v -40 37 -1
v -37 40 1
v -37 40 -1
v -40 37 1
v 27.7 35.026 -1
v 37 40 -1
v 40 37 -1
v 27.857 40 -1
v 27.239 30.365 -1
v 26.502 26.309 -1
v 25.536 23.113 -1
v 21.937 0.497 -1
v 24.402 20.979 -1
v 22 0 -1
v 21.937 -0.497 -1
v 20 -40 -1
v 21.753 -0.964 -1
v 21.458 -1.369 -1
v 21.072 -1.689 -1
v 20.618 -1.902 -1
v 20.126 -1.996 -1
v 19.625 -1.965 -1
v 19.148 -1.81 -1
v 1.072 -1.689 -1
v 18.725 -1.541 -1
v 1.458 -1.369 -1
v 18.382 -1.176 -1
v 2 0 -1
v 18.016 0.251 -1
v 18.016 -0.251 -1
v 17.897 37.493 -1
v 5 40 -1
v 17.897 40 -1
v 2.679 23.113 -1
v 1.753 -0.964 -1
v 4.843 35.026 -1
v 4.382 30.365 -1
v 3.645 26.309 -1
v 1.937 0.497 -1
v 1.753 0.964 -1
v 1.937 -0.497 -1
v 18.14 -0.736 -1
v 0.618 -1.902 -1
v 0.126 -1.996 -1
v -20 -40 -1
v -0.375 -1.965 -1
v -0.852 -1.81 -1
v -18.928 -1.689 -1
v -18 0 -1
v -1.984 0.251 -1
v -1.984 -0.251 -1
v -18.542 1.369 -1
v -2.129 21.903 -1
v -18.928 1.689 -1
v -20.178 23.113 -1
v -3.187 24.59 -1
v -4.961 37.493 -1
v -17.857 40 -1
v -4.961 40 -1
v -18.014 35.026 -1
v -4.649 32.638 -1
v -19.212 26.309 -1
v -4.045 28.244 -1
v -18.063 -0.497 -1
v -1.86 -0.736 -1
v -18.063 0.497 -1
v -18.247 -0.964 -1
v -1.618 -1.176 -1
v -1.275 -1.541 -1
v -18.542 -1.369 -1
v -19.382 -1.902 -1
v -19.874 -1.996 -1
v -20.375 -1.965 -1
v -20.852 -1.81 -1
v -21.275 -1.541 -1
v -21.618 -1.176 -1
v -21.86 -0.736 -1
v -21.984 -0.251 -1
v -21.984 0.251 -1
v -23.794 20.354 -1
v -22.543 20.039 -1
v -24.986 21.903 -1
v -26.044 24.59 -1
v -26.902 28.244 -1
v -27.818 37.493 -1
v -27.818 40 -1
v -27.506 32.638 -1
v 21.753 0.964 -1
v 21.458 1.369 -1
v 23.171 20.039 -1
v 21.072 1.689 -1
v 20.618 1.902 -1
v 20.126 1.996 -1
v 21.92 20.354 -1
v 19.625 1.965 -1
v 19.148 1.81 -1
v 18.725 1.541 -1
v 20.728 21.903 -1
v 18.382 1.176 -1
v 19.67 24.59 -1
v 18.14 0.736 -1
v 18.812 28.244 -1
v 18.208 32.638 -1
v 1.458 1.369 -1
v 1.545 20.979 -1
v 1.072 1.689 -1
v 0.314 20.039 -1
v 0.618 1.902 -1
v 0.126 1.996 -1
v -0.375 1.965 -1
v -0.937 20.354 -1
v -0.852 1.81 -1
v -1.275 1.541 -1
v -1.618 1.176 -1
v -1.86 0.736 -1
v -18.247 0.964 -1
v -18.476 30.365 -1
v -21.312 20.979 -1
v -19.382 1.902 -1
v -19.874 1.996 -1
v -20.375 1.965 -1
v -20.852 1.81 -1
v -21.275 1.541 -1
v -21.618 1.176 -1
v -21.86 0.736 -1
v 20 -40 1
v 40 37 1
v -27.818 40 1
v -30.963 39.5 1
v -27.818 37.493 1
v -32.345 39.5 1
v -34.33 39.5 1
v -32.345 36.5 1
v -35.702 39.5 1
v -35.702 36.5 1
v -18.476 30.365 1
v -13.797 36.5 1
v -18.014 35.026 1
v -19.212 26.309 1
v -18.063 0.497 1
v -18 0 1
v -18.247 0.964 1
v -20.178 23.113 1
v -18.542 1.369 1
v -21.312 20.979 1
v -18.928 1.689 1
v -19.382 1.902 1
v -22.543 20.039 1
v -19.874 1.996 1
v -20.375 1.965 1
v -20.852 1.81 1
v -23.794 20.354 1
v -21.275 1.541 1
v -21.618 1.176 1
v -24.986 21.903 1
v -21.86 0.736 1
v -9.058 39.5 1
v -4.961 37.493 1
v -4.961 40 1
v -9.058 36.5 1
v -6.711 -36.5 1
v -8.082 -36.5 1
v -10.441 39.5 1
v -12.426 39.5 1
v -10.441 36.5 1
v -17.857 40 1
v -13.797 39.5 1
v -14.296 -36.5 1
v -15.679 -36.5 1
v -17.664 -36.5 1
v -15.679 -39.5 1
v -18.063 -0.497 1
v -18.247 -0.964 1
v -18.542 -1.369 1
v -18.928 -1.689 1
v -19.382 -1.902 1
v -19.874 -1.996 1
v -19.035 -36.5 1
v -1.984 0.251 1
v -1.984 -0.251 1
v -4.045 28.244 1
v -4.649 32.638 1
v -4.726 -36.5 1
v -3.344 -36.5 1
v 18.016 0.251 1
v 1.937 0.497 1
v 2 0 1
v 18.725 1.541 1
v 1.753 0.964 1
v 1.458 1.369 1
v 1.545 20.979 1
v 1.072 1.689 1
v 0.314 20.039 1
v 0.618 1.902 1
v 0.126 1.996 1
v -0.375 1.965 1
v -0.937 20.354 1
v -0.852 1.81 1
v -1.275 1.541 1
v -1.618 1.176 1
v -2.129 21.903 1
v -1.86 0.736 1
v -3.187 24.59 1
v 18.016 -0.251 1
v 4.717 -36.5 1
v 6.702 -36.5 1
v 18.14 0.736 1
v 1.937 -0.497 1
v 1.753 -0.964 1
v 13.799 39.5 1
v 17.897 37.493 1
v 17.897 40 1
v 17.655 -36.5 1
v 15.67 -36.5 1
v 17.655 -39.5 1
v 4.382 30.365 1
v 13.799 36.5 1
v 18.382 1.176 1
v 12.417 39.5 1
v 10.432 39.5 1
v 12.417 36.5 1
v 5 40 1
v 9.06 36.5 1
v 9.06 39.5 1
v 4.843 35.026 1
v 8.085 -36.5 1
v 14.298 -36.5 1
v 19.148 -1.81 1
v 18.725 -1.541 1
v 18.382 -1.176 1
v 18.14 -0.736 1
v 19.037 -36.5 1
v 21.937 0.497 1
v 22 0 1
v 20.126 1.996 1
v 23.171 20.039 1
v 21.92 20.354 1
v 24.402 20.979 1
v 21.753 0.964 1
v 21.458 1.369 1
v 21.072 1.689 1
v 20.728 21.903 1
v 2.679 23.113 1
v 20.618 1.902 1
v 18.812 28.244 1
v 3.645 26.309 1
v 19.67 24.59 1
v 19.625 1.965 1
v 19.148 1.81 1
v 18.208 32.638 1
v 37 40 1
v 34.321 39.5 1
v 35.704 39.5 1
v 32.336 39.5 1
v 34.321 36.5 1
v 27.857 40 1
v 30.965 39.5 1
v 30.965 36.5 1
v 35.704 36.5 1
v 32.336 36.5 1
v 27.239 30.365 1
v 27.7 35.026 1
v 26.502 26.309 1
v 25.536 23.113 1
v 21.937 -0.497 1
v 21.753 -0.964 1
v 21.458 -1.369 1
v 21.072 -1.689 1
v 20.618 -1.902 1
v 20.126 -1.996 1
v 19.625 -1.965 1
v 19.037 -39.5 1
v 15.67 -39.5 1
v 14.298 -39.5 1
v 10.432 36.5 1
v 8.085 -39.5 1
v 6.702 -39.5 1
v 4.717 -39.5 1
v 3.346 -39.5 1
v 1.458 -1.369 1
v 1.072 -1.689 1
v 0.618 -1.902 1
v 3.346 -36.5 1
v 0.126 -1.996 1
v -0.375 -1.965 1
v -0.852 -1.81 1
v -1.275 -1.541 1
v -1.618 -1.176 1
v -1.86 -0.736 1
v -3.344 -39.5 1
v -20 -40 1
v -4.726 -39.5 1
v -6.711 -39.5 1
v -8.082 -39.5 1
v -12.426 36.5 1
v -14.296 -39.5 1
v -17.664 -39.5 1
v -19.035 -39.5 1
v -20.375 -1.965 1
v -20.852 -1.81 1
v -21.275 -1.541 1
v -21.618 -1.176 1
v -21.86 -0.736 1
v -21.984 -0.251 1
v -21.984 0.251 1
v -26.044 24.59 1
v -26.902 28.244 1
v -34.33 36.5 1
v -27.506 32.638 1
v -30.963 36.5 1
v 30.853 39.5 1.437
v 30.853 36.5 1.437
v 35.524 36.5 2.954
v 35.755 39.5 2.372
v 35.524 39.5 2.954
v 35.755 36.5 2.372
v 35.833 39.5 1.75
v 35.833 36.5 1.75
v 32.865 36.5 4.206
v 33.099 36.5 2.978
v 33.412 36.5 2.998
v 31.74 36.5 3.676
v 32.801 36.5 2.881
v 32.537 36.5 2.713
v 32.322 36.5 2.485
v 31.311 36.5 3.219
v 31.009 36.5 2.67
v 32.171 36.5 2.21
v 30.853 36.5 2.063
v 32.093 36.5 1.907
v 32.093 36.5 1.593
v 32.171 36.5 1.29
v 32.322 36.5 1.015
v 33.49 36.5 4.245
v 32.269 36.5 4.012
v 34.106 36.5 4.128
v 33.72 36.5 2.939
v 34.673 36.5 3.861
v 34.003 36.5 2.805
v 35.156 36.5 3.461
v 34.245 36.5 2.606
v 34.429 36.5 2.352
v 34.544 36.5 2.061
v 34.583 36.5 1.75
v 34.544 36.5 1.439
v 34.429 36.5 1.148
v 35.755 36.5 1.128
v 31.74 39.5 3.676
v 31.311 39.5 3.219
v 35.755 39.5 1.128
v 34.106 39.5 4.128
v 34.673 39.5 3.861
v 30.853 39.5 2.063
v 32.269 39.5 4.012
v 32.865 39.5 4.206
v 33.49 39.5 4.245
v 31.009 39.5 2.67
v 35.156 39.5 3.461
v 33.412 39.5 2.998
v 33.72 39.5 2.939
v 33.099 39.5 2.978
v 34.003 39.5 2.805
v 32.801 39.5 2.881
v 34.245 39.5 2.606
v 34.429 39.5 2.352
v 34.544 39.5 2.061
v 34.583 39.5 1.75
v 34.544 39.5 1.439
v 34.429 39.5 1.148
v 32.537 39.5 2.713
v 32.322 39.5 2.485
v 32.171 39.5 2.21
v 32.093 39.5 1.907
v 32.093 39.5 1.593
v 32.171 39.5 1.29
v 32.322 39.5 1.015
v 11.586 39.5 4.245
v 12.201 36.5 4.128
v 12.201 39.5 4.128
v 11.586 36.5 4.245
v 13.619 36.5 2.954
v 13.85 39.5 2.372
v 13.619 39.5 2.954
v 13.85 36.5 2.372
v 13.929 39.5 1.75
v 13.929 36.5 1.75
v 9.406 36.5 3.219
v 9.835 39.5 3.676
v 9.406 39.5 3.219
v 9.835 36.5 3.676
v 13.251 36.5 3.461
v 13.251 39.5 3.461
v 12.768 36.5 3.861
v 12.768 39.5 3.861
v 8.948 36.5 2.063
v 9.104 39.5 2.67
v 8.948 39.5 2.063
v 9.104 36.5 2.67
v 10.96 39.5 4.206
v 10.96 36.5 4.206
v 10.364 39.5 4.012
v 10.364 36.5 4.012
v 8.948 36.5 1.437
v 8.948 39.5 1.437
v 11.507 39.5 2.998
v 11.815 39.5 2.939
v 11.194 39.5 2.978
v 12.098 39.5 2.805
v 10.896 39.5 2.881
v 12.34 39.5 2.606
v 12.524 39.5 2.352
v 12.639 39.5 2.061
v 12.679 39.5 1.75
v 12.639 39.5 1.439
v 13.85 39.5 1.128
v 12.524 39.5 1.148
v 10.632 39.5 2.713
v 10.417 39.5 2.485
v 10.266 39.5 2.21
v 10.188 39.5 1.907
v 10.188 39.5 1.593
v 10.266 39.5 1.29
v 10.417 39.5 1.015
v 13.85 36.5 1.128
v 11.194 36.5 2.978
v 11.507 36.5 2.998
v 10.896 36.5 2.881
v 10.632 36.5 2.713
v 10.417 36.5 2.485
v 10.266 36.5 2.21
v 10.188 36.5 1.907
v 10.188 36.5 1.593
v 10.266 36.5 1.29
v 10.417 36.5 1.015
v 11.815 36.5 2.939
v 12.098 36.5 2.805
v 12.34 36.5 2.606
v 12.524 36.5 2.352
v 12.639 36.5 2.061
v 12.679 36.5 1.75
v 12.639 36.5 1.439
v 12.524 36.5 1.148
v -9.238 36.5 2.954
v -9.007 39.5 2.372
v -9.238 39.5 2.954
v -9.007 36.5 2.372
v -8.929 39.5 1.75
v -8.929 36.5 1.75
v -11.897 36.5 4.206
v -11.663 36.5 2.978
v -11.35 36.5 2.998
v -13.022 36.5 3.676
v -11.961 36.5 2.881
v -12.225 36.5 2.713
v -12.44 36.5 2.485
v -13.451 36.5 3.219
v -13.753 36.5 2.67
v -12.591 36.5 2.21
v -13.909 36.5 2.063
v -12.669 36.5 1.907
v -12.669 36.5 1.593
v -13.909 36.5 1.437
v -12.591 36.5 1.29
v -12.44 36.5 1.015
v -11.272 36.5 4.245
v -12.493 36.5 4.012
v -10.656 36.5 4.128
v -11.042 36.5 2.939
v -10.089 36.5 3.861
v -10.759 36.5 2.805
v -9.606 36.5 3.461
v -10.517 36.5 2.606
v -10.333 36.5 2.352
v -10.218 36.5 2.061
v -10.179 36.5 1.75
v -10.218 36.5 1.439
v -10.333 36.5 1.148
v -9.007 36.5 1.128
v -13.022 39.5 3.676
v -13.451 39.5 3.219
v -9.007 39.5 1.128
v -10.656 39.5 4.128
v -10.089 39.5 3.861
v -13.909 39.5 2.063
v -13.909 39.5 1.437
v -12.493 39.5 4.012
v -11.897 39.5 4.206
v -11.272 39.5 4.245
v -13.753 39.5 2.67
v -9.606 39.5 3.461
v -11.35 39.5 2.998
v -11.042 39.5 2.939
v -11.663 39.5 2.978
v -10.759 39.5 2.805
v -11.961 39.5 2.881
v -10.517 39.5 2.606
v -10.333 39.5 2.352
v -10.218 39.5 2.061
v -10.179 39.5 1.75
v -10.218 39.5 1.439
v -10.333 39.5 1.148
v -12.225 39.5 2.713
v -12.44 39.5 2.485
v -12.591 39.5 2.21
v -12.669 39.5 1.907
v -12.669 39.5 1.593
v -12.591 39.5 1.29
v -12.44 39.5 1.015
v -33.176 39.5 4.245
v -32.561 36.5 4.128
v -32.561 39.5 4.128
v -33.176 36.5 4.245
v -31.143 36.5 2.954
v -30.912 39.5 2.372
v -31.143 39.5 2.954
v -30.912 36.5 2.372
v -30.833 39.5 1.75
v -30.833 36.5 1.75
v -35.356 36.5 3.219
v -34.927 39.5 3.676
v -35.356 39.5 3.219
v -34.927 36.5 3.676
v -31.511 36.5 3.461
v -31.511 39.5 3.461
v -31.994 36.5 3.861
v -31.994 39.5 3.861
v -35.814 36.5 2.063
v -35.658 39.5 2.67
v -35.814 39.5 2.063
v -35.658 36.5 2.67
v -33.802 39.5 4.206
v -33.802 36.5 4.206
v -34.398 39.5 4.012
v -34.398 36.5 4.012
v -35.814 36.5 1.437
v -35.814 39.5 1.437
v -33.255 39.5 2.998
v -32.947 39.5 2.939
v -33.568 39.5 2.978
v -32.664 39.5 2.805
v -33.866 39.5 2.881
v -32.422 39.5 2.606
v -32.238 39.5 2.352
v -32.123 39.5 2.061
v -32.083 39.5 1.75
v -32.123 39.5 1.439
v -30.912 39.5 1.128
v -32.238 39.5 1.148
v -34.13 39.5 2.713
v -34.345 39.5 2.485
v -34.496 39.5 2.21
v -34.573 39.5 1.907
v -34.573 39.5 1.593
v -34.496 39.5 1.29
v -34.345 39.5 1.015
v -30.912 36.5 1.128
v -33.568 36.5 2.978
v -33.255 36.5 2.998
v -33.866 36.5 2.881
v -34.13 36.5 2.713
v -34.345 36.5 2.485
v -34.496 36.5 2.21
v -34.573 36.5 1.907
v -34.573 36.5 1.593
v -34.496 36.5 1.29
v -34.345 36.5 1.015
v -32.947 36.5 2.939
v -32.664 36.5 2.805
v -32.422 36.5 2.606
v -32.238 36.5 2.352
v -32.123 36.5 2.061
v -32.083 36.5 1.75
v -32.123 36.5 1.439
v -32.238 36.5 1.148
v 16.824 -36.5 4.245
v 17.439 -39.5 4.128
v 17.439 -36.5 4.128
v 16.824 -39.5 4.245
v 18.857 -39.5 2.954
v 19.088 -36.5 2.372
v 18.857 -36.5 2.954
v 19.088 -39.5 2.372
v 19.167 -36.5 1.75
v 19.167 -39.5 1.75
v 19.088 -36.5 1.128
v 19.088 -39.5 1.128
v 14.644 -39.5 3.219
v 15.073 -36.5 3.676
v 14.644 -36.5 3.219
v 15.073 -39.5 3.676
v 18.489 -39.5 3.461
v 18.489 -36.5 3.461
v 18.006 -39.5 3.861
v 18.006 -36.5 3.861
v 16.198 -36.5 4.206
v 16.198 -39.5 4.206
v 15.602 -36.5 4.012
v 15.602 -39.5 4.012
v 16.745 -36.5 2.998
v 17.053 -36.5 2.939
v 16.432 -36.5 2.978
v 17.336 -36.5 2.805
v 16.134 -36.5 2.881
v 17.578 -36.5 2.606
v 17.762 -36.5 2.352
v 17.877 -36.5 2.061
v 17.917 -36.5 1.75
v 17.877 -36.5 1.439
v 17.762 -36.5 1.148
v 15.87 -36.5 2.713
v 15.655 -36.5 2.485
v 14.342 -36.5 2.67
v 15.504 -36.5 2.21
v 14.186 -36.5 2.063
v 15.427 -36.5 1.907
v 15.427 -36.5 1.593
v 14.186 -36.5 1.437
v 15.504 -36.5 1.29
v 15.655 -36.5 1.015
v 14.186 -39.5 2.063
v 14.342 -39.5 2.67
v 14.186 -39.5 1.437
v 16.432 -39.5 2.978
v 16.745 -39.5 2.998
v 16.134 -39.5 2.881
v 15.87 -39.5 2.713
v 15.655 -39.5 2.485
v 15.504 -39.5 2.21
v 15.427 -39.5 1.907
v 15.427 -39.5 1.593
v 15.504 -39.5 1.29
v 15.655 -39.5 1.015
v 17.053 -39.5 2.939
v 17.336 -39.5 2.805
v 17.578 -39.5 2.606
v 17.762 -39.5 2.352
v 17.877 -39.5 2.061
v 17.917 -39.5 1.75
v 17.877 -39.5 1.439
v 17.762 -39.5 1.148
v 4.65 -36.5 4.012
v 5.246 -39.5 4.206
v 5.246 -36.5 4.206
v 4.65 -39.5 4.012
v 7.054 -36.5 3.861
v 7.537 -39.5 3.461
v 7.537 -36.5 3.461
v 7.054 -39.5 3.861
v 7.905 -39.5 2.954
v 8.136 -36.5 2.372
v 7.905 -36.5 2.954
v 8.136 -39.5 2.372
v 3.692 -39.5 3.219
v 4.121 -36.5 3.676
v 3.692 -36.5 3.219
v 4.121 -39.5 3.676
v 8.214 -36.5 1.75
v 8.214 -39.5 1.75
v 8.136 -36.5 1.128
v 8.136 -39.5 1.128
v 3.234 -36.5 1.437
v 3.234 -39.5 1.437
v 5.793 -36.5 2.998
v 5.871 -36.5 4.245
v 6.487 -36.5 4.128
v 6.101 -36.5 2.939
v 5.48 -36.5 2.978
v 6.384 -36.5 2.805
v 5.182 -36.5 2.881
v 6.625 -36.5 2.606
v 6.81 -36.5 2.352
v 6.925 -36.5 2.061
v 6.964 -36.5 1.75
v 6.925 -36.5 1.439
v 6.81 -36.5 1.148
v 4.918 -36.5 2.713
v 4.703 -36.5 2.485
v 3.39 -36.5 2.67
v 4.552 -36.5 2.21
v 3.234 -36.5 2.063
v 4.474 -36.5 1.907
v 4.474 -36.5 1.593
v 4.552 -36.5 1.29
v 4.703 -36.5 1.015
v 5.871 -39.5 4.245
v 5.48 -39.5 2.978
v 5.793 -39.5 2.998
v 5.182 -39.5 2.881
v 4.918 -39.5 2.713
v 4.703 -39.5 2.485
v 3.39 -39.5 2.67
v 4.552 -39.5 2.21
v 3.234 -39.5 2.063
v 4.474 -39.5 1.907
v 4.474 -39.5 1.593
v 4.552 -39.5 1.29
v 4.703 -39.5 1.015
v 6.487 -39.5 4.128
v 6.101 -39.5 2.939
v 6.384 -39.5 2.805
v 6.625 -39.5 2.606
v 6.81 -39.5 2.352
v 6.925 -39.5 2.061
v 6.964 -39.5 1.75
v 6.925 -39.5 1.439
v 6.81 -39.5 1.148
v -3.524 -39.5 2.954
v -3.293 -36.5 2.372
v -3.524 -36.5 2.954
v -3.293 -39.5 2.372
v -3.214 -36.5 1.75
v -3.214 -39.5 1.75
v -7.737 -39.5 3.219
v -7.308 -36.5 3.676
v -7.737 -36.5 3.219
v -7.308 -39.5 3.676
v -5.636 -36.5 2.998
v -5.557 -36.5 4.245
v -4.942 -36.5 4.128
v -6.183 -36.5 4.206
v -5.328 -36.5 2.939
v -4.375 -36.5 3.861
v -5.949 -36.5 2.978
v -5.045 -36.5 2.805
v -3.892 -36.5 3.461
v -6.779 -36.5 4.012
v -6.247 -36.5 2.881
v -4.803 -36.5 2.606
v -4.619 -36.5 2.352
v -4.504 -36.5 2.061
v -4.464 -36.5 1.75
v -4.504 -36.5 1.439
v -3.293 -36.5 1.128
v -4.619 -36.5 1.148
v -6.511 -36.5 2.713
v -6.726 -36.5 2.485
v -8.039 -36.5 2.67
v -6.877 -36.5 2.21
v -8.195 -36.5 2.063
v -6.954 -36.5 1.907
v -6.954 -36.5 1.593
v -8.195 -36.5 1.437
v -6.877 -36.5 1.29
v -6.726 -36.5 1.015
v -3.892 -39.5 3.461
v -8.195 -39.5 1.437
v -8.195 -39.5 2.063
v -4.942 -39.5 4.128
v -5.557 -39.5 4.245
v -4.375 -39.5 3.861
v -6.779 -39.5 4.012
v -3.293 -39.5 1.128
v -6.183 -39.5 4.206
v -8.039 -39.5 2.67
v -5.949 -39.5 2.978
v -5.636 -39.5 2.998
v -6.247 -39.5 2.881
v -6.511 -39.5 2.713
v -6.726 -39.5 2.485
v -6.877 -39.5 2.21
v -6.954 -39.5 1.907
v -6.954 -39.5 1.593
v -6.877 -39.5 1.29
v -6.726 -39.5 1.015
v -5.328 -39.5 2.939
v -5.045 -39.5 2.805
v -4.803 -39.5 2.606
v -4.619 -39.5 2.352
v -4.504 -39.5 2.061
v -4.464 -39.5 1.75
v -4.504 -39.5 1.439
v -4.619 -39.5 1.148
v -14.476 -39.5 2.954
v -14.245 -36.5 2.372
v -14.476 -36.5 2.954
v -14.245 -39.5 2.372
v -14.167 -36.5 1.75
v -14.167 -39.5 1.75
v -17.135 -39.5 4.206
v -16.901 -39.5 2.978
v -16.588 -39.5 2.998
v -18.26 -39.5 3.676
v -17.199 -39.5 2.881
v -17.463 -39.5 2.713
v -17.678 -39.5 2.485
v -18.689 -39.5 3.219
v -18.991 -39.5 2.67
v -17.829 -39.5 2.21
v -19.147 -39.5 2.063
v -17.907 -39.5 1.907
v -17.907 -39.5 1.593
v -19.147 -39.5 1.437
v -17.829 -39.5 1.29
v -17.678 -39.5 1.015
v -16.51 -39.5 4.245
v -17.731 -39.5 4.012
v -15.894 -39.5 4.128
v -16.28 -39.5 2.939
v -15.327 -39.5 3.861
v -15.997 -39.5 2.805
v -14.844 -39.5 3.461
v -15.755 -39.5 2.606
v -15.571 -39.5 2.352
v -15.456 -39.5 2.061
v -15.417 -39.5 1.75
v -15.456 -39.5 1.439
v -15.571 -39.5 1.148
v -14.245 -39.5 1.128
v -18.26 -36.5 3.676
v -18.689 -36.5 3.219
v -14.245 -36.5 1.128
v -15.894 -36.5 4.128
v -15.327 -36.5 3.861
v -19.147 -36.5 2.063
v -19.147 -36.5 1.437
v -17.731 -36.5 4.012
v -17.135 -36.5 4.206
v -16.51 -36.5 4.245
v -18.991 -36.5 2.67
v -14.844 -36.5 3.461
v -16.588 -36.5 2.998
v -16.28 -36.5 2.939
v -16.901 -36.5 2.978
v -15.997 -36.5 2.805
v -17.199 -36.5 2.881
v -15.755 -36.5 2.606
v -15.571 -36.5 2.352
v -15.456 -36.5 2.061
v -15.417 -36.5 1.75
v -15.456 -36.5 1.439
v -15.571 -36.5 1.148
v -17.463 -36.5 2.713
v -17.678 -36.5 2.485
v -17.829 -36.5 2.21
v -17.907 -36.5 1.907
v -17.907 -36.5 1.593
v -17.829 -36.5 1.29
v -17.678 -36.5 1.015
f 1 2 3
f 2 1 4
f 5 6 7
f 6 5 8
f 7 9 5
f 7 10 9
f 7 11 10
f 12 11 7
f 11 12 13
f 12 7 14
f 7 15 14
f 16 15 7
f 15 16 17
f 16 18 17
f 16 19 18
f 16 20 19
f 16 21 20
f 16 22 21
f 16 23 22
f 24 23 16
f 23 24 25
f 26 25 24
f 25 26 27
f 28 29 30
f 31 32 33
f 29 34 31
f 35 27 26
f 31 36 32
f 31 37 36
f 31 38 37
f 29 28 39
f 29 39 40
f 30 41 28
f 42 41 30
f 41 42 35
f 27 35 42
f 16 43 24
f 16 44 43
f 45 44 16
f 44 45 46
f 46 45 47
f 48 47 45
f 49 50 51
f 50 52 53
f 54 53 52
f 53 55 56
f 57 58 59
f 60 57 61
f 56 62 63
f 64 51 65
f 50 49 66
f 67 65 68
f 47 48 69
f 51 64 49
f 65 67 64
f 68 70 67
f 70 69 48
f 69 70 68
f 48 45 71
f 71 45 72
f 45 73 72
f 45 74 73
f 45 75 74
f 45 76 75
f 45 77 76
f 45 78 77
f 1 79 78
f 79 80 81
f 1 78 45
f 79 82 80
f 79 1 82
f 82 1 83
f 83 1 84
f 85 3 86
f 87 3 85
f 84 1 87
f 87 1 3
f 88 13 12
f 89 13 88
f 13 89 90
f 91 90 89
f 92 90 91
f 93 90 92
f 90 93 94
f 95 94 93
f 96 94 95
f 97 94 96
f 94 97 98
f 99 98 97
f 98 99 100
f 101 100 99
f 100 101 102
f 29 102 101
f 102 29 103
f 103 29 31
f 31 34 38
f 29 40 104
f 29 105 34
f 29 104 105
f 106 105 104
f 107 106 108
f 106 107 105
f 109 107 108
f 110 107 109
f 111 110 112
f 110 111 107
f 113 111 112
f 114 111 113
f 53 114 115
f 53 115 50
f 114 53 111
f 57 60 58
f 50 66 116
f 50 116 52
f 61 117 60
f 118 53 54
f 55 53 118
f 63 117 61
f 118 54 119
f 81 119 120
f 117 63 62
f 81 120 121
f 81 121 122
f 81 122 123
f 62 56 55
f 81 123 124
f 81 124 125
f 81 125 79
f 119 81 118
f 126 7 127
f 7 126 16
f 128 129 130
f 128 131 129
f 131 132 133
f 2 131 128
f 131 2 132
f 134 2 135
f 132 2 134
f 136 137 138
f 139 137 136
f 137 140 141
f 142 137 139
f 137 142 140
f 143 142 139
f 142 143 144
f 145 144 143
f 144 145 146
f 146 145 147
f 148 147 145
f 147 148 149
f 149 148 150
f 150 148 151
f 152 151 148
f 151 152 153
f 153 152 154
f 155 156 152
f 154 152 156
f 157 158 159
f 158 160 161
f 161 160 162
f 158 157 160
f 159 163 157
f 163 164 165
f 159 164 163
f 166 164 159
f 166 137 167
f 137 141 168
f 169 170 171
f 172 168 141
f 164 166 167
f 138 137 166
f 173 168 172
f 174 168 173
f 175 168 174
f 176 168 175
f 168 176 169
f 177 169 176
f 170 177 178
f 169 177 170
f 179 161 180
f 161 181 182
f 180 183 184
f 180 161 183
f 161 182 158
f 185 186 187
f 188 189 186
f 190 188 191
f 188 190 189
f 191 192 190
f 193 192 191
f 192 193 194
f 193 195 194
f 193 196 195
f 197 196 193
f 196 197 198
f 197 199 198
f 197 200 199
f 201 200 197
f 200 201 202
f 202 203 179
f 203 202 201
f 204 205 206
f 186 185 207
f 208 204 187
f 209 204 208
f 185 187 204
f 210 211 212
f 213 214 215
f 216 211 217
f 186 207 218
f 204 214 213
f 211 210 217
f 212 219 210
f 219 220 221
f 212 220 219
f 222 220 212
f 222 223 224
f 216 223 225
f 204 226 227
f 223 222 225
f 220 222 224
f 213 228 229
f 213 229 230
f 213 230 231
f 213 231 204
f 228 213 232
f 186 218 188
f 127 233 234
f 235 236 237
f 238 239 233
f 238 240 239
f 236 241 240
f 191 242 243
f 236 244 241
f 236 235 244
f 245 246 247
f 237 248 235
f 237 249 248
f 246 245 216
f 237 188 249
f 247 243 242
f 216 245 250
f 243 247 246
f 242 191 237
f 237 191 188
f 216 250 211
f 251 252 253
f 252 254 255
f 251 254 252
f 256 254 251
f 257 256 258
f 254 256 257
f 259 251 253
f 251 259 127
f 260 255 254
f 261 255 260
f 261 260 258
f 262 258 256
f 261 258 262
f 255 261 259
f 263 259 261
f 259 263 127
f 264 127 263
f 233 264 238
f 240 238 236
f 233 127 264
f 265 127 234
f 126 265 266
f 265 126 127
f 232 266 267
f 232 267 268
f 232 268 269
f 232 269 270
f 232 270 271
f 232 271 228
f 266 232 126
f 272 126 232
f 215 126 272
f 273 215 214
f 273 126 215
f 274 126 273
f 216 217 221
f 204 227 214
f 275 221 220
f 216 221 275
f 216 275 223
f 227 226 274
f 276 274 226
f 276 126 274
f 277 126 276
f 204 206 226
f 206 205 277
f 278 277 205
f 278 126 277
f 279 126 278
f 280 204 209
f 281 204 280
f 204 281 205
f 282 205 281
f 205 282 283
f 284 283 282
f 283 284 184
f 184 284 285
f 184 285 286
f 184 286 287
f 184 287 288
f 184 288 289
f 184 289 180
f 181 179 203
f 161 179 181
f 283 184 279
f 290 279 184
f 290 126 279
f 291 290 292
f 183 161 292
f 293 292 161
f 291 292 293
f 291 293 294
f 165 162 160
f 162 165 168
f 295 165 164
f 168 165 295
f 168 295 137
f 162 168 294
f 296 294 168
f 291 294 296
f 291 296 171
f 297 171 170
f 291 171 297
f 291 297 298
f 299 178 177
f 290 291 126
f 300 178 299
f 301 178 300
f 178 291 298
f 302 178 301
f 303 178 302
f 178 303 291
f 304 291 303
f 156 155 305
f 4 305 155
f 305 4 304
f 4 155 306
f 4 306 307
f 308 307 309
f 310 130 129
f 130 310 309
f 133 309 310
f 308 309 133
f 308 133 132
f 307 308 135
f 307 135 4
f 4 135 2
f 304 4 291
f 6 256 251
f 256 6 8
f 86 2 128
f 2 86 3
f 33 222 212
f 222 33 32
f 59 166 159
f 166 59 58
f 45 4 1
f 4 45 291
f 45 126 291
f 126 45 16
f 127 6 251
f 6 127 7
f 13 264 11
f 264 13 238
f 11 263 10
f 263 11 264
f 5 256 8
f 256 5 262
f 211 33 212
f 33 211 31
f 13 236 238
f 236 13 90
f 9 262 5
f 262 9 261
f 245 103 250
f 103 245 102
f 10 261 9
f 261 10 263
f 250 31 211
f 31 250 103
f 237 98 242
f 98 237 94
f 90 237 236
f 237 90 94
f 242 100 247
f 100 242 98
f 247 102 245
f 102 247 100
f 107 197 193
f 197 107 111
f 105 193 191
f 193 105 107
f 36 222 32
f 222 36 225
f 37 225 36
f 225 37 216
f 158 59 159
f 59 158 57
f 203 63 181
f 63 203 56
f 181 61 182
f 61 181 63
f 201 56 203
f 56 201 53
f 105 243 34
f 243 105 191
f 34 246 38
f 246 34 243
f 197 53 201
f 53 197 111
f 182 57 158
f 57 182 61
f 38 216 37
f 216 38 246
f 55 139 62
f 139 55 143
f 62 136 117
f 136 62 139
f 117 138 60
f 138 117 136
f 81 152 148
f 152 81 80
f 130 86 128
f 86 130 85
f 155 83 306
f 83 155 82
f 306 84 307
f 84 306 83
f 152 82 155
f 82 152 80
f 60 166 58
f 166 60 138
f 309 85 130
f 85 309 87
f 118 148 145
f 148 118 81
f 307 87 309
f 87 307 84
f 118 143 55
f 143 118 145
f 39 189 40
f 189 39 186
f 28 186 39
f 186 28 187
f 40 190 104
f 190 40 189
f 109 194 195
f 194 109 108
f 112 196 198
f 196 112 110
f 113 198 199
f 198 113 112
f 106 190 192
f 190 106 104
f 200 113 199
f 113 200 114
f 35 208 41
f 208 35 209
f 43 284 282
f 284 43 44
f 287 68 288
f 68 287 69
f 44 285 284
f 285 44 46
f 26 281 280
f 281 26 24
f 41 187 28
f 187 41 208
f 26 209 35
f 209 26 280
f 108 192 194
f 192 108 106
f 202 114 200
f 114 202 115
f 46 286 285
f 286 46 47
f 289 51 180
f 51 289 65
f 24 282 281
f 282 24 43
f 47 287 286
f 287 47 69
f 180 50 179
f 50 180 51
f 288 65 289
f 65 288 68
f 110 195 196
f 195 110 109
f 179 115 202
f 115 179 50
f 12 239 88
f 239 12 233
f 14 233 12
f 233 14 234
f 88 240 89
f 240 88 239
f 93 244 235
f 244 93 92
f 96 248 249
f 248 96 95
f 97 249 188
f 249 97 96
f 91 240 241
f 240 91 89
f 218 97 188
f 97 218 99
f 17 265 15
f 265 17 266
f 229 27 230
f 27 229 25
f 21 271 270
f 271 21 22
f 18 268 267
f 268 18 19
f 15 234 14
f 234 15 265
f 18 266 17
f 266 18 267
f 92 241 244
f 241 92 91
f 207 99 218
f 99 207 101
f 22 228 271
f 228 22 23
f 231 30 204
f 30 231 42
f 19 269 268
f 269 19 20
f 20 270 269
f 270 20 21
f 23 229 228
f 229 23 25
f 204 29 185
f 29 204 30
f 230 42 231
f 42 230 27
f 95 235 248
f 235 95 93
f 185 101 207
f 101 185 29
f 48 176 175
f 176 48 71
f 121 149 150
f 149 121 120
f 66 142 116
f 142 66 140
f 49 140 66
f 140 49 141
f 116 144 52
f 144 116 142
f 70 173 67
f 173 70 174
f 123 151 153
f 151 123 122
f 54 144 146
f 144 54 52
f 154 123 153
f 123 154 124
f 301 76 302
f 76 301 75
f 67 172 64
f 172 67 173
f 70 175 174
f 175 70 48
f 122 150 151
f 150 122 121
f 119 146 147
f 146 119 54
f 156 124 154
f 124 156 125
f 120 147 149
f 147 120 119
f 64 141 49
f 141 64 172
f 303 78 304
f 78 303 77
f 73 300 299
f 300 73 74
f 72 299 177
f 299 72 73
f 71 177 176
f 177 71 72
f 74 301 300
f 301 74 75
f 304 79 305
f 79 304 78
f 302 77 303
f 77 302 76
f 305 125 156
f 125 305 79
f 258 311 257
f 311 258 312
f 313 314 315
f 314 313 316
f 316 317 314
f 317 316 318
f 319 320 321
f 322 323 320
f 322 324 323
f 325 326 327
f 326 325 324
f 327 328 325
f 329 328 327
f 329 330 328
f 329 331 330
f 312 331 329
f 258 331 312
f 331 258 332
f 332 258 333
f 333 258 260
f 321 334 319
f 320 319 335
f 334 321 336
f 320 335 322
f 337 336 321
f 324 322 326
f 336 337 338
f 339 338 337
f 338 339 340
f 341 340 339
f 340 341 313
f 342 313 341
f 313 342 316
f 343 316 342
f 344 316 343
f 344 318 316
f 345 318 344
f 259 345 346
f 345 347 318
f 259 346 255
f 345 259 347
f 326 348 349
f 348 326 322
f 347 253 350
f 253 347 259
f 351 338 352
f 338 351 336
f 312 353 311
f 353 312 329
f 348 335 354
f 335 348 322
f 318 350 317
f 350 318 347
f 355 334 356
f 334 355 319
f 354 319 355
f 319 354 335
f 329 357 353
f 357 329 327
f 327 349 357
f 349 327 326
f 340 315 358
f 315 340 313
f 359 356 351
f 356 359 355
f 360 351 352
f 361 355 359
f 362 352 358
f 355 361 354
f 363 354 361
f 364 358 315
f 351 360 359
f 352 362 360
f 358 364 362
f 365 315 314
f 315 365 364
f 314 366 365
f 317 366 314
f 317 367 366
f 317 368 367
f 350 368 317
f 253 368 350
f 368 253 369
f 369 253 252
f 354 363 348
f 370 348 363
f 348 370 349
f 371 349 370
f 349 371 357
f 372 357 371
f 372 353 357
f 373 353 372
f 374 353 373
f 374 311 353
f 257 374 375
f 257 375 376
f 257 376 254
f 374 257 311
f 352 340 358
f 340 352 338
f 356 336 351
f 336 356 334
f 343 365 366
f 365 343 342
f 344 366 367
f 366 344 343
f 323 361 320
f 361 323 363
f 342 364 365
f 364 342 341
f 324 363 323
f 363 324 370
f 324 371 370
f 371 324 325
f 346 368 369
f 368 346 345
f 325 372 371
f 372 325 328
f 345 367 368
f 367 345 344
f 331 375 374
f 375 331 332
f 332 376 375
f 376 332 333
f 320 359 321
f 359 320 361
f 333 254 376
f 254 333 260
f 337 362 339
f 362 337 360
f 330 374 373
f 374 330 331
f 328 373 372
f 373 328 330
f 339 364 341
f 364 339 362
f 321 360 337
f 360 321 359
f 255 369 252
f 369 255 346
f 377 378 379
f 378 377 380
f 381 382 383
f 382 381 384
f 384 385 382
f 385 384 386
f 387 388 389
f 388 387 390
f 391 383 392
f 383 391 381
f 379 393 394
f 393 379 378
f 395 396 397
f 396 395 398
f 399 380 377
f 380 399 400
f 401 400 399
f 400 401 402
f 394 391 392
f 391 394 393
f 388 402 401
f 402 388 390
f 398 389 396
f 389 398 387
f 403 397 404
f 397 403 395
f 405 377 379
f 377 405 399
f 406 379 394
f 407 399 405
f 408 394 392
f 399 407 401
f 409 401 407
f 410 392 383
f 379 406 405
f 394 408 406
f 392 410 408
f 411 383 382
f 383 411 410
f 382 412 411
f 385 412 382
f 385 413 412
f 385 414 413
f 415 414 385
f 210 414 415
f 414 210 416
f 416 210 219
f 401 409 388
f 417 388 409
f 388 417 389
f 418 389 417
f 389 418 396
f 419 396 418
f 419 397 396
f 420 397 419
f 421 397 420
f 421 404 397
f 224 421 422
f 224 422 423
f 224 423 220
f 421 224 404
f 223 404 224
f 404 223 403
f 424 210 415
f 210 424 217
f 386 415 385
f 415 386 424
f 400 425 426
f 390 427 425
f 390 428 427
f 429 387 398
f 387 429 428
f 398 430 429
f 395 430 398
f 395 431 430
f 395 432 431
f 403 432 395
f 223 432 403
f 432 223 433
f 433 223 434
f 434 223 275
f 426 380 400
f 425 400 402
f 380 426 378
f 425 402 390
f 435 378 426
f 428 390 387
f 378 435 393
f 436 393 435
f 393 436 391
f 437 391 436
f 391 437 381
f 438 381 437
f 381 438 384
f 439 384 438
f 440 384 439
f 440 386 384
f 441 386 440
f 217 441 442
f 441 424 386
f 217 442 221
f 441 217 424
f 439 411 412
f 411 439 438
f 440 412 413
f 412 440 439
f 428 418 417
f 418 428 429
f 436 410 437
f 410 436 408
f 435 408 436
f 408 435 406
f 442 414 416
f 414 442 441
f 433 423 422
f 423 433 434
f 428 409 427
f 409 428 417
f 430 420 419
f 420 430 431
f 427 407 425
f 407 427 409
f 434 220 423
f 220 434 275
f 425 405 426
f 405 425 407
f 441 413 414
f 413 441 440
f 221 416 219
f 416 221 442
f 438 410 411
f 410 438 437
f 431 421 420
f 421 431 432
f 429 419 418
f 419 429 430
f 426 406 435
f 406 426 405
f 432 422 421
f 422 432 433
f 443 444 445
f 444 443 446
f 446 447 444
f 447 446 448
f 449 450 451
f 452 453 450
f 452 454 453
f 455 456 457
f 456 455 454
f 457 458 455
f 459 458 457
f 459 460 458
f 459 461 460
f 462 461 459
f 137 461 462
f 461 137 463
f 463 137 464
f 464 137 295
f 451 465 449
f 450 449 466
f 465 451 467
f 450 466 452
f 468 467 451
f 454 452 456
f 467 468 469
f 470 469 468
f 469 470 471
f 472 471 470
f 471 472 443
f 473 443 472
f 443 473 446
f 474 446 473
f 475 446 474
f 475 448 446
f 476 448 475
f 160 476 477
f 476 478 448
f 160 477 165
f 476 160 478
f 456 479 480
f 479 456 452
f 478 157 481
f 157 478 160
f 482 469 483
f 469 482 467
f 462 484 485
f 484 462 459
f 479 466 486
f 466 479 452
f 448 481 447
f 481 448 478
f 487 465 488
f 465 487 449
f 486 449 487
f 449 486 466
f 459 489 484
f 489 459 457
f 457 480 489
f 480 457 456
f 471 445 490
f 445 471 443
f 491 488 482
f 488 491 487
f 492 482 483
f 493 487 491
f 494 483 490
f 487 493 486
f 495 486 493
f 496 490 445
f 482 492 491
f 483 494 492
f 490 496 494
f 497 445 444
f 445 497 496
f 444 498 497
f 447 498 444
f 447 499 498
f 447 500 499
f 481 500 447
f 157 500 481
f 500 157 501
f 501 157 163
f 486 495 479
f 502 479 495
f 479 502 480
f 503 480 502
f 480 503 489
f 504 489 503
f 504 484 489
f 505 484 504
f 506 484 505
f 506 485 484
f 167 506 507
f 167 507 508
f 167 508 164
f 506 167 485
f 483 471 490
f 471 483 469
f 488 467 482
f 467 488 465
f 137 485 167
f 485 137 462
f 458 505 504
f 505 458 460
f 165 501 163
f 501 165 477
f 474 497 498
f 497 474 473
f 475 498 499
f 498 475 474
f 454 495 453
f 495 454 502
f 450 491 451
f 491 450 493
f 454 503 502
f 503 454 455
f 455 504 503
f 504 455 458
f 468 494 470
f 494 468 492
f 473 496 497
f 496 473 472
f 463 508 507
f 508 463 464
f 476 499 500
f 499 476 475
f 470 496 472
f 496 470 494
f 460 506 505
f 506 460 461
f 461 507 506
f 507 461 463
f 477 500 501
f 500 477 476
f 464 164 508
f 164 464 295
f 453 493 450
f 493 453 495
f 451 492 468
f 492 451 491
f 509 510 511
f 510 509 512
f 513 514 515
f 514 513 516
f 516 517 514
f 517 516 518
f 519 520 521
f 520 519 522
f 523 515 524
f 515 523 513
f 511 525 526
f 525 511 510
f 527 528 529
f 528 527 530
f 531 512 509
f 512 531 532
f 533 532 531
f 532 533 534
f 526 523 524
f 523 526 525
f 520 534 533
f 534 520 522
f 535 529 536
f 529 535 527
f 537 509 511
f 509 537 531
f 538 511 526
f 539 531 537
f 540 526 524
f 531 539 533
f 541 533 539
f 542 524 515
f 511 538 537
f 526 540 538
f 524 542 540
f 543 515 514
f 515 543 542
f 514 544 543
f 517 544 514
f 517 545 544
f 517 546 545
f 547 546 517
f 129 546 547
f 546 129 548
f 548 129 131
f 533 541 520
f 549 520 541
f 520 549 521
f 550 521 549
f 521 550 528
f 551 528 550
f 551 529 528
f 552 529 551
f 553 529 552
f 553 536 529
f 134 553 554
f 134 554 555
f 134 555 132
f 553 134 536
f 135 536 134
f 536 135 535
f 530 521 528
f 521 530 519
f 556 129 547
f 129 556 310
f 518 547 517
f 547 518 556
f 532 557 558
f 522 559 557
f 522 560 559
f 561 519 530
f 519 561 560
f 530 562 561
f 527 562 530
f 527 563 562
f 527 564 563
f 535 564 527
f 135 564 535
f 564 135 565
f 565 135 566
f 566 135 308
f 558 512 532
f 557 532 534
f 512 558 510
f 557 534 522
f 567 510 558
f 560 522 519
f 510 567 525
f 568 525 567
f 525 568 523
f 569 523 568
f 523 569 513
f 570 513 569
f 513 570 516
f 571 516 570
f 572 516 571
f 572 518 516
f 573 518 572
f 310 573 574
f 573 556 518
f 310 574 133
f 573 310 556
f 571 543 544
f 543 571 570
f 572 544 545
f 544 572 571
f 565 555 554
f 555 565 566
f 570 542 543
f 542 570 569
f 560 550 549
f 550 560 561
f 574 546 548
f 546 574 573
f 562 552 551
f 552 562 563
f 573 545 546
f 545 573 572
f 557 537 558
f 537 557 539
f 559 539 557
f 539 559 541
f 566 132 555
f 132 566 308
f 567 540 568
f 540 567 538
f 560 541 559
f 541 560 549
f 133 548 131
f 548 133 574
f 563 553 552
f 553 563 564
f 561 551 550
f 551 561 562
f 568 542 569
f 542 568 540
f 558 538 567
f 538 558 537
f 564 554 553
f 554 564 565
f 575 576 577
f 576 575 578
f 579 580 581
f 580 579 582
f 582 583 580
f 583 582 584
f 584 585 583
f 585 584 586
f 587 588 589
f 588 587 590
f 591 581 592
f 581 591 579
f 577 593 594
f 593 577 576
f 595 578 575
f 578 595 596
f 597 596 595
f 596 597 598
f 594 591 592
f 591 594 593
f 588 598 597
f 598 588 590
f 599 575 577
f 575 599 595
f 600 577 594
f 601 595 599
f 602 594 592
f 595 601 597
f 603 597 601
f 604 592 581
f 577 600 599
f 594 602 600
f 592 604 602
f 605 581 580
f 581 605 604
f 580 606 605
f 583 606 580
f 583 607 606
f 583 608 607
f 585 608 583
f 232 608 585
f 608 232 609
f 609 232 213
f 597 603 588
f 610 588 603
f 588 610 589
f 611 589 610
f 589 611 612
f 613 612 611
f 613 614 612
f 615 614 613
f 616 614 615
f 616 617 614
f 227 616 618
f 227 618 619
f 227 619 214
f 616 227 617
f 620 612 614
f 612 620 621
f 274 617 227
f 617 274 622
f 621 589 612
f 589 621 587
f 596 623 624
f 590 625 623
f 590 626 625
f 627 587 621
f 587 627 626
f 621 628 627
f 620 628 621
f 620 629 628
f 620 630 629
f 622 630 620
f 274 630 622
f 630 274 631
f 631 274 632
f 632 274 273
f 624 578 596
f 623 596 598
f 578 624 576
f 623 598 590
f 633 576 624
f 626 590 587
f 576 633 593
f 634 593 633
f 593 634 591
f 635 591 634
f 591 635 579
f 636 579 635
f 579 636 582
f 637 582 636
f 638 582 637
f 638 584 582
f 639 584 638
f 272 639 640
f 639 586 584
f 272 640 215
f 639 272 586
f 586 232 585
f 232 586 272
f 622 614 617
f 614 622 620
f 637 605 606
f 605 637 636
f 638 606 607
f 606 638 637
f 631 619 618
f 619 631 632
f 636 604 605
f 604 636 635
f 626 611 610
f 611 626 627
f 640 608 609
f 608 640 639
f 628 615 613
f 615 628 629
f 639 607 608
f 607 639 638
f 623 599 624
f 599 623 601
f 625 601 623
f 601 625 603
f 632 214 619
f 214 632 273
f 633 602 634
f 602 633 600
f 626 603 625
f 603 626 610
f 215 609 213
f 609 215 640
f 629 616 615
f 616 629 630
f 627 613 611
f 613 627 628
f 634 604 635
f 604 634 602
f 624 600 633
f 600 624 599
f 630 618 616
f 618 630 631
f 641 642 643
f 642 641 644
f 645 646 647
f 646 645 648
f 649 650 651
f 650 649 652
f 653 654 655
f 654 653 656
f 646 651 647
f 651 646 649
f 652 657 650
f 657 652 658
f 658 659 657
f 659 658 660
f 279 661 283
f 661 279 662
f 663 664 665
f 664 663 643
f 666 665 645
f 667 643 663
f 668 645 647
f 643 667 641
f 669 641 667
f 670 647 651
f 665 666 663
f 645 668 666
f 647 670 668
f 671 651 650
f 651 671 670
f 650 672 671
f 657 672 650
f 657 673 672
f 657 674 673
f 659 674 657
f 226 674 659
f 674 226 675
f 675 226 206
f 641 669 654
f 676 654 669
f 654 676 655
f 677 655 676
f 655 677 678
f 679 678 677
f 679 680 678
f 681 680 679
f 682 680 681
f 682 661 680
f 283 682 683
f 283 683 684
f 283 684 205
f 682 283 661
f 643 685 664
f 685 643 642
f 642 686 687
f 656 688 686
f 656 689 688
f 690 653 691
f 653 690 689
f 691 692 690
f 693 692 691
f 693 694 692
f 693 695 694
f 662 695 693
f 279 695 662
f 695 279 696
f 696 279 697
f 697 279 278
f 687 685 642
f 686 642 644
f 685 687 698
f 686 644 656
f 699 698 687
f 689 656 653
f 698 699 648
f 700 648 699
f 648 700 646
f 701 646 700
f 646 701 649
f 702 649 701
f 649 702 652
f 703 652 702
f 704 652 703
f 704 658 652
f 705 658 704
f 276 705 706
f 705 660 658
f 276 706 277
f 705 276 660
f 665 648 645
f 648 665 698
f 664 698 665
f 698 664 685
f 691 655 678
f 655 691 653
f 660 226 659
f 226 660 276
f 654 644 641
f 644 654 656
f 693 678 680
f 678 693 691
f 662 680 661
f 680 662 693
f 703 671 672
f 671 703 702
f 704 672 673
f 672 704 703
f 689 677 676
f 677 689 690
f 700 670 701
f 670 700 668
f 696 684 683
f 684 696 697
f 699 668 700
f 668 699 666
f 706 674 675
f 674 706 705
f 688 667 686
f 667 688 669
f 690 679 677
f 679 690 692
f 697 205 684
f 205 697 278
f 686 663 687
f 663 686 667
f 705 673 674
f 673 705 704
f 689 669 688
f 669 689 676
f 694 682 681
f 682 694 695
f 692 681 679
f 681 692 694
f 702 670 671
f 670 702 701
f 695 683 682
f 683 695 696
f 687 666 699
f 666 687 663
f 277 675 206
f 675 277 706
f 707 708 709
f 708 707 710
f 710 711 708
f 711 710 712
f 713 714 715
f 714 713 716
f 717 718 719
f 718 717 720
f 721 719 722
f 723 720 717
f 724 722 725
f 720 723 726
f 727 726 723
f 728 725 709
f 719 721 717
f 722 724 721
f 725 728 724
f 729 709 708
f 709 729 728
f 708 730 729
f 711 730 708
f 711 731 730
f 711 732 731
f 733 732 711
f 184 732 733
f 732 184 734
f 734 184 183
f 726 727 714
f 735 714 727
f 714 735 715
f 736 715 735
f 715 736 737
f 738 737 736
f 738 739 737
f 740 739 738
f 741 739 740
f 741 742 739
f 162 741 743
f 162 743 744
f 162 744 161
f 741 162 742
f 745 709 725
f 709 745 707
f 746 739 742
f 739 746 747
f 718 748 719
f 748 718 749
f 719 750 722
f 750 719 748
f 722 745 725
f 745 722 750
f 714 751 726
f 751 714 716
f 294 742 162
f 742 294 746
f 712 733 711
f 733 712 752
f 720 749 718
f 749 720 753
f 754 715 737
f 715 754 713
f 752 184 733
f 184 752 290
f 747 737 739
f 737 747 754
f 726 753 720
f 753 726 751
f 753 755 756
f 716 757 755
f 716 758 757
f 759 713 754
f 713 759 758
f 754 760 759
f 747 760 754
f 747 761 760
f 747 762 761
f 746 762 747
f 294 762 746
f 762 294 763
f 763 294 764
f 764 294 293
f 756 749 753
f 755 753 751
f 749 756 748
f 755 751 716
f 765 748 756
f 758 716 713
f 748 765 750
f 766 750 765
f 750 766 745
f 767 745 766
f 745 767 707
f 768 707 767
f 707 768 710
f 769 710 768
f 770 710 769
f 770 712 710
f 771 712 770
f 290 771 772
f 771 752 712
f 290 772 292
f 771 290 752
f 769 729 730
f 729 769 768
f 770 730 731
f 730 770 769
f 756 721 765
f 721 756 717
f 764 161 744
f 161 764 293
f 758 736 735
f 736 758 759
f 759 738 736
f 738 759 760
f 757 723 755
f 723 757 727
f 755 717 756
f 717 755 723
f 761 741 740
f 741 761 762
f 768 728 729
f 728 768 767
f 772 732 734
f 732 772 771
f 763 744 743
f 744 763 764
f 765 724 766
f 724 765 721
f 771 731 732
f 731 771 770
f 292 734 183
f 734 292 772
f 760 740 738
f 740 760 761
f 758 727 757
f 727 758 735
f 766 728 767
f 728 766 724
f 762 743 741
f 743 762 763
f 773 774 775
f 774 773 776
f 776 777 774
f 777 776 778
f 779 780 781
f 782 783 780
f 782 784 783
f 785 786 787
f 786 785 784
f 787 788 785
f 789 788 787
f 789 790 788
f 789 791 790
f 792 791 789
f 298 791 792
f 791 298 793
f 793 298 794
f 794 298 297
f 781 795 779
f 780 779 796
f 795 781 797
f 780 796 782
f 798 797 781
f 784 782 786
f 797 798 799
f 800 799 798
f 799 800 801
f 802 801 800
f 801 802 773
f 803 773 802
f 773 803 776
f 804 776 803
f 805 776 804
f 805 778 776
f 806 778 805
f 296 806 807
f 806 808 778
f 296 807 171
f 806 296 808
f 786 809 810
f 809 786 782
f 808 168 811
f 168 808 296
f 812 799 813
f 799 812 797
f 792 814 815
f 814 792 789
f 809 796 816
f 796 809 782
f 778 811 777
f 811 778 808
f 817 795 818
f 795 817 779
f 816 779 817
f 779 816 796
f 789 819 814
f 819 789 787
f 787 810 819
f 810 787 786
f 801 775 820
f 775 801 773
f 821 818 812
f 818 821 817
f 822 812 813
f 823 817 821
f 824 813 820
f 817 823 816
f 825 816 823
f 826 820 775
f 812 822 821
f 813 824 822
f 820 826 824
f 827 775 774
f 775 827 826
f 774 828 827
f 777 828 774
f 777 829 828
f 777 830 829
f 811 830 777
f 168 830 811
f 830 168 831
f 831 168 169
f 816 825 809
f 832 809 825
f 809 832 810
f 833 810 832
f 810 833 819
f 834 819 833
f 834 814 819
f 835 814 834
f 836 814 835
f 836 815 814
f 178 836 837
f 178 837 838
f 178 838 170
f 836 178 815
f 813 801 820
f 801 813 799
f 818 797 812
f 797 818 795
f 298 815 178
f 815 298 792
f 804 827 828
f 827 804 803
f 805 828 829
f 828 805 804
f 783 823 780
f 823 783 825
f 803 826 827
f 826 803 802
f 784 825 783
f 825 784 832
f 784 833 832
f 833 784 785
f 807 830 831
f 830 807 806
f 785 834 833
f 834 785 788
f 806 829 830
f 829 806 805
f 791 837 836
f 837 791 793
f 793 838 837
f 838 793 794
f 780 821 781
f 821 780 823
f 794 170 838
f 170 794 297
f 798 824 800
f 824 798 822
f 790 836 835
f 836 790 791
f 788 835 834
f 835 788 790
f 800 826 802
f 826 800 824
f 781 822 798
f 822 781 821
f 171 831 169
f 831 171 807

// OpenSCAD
// [FL_INDEX: keywords="openscad, 3d_parametric, cable_guide_for_custom_partial_finger_replacement, csg_solid" | COT="Parametric OpenSCAD design from 3DCodeverse"]
// Title: cable guide for custom partial finger replacement

//(knuckle width) - Measurement E
kw=80;

/*[hidden]*/
$fn=25;


union(){

difference(){
linear_extrude(height=2,center=true)polygon([ [kw/2,kw/2-3],[kw/2-3,kw/2],[-kw/2+3,kw/2],[-kw/2,kw/2-3],[-kw/4,-kw/2],[kw/4,-kw/2] ]);

//webbing spaces
translate([kw/3.5,40,0])scale([1,4,1])cylinder(r=kw/16,h=4,center=true);
translate([0,40,0])scale([1,4,1])cylinder(r=kw/16,h=4,center=true);
translate([-kw/3.5,40,0])scale([1,4,1])cylinder(r=kw/16,h=4,center=true);

//strap mount holes
cylinder(r=2,h=4,center=true);
translate([kw/4,0,0])cylinder(r=2,h=4,center=true);
translate([-kw/4,0,0])cylinder(r=2,h=4,center=true);

}

//knuckle guides
difference(){
translate([kw/2.4,kw/2-2,1.75])rotate([90,0,0])cylinder(r=2.5,h=3,center=true);
translate([kw/2.4,kw/2-2,1.75])rotate([90,0,0])cylinder(r=1.25,h=5,center=true);
}

difference(){
translate([kw/7,kw/2-2,1.75])rotate([90,0,0])cylinder(r=2.5,h=3,center=true);
translate([kw/7,kw/2-2,1.75])rotate([90,0,0])cylinder(r=1.25,h=5,center=true);
}

difference(){
translate([-kw/7,kw/2-2,1.75])rotate([90,0,0])cylinder(r=2.5,h=3,center=true);
translate([-kw/7,kw/2-2,1.75])rotate([90,0,0])cylinder(r=1.25,h=5,center=true);
}

difference(){
translate([-kw/2.4,kw/2-2,1.75])rotate([90,0,0])cylinder(r=2.5,h=3,center=true);
translate([-kw/2.4,kw/2-2,1.75])rotate([90,0,0])cylinder(r=1.25,h=5,center=true);
}


//wrist guides
difference(){
translate([(kw/2.4)/2,-kw/2+2,1.75])rotate([90,0,0])cylinder(r=2.5,h=3,center=true);
translate([(kw/2.4)/2,-kw/2+2,1.75])rotate([90,0,0])cylinder(r=1.25,h=5,center=true);
}

difference(){
translate([(kw/7)/2,-kw/2+2,1.75])rotate([90,0,0])cylinder(r=2.5,h=3,center=true);
translate([(kw/7)/2,-kw/2+2,1.75])rotate([90,0,0])cylinder(r=1.25,h=5,center=true);
}

difference(){
translate([(-kw/7)/2,-kw/2+2,1.75])rotate([90,0,0])cylinder(r=2.5,h=3,center=true);
translate([(-kw/7)/2,-kw/2+2,1.75])rotate([90,0,0])cylinder(r=1.25,h=5,center=true);
}

difference(){
translate([(-kw/2.4)/2,-kw/2+2,1.75])rotate([90,0,0])cylinder(r=2.5,h=3,center=true);
translate([(-kw/2.4)/2,-kw/2+2,1.75])rotate([90,0,0])cylinder(r=1.25,h=5,center=true);
}

}
